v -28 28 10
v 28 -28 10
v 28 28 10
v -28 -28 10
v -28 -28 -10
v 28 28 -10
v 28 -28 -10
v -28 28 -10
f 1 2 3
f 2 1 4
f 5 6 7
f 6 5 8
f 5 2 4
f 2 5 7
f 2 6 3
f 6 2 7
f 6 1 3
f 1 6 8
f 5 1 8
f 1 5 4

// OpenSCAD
module clock_movement() {
    
    // box-shaped main body
    width = 56;
    depth = 56;
    height = 20;
    
    // main body
    color("Gray")
//    translate( [-width / 2, -depth / 2, -height] )
    cube( [width, depth, height], center = true ); // tutorial is not in center (?)
    
    }
    
clock_movement();
